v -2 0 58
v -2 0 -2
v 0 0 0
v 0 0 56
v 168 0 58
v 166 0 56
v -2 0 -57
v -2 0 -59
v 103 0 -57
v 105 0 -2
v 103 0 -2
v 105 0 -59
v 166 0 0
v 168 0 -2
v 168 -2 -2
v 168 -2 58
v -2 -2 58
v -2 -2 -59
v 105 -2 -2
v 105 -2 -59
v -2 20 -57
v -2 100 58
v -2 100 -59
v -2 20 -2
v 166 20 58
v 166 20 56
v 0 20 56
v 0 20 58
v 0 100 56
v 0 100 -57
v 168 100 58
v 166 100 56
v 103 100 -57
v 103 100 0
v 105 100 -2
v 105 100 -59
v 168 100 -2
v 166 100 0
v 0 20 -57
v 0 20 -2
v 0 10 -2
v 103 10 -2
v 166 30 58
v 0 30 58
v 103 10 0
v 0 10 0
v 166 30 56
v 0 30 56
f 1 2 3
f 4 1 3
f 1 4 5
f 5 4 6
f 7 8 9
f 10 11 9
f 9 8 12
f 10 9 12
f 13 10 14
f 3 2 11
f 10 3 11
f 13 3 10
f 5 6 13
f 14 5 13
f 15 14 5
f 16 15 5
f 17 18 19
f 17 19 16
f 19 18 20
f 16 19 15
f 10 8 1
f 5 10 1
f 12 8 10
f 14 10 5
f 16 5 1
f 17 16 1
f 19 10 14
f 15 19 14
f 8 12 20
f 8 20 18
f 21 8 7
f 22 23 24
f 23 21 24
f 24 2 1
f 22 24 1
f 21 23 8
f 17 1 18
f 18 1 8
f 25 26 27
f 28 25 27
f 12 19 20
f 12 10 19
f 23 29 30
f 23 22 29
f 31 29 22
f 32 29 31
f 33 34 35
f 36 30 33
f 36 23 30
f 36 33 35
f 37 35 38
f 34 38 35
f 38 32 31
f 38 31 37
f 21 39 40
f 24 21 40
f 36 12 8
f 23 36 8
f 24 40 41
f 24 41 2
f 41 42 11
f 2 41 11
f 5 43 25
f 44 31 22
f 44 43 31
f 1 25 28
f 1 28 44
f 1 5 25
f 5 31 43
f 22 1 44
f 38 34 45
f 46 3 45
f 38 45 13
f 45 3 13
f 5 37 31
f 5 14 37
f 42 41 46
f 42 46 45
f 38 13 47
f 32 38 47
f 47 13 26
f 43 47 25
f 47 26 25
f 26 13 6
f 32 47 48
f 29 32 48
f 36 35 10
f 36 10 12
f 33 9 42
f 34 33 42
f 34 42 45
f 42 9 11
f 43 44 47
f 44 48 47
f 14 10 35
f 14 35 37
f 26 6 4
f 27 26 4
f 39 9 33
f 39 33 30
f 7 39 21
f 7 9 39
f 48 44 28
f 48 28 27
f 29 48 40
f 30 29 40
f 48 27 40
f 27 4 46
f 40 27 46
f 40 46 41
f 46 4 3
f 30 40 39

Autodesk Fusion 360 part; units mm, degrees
sketch "Sketch1" plane through (0, 0, 0) normal (0, 1, 0) x (1, 0, 0)
  line L0 (0, 0) -> (166, 0)
  line L1 (166, 0) -> (166, -56)
  line L2 (166, -56) -> (0, -56)
  line L3 (0, -56) -> (0, 0)
  line L4 (168, -58) -> (-2, -58)
  line L5 (-2, -58) -> (-2, 2)
  line L6 (-2, 2) -> (168, 2)
  line L7 (168, 2) -> (168, -58)
  line L8 (0, 2) -> (103, 2)
  line L9 (103, 2) -> (103, 57)
  line L10 (103, 57) -> (0, 57)
  line L11 (0, 57) -> (0, 2)
  line L12 (105, 0) -> (105, 59)
  line L13 (105, 59) -> (-2, 59)
  line L14 (-2, 59) -> (-2, 0)
  line L15 (-2, 0) -> (105, 0)
  line L16 (0, 2) -> (0, 0)
  dimension "d1" = 166
  dimension "d2" = 56
  dimension "d3" = -2
  dimension "d4" = 103
  dimension "d5" = 55
  dimension "d6" = 2
extrude "Extrude1" add sketch "Sketch1" along normal blind 50 contours L6 L9 L10 L11 L12 L13 L14 makes body 1
extrude "Extrude2" add sketch "Sketch1" along normal blind 10 contours L0 L6 L8 L12 L15 L16 | L5 L6 L14 L15 L16 bodies 1
extrude "Extrude3" add sketch "Sketch1" along normal blind 50 separate body contours L0 L1 L2 L3 L4 L5 L6 L7 L12 L15 makes body 2
extrude "Extrude4" add 1 faces at (-1.3333, 23.3333, -2) along direction (0, 0, 1) blind 2 on bodies 1 bodies 1 2
extrude "Extrude5" add sketch "Sketch1" against normal blind 2 separate body makes body 3
sketch "Sketch2" plane through (-2, 0, 0) normal (-1, 0, 0) x (0, 0, 1)
  line L0 (-59, 0) -> (58, 0)
  line L1 (58, 0) -> (58, 50)
  line L2 (58, 50) -> (-59, 50)
  line L3 (-59, 50) -> (-59, 0)
sketch "Sketch3" plane through (0, 0, 0) normal (1, 0, 0) x (0, 0, -1)
  line L0 (2, 0) -> (57, 0)
  line L1 (57, 0) -> (57, 50)
  line L2 (57, 50) -> (-56, 50)
  line L3 (-56, 50) -> (-56, 0)
  line L4 (-56, 0) -> (0, 0)
  line L5 (0, 0) -> (0, 10)
  line L6 (0, 10) -> (2, 10)
  line L7 (2, 10) -> (2, 0)
  line L8 (2, 0) -> (57, 0)
  line L9 (57, 0) -> (57, 20)
  line L10 (57, 20) -> (2, 20)
  line L11 (2, 20) -> (2, 0)
  dimension "d17" = 20
extrude "Extrude6" cut sketch "Sketch3" against normal blind 2 contours L0 L1 L7 L8 L9 L10 L11 bodies 1
extrude "Extrude7" add 1 faces at (103.6667, 23.3333, -2) along direction (0, 0, 1) blind 2 on bodies 1 bodies 1
sketch "Sketch4" plane through (0, 50, 0) normal (0, 1, 0) x (-1, 0, 0)
  line L0 (-105, -2) -> (-105, -59)
  line L1 (-105, -59) -> (2, -59)
  line L2 (2, -59) -> (2, 58)
  line L3 (2, 58) -> (-168, 58)
  line L4 (-168, 58) -> (-168, -2)
  line L5 (-168, -2) -> (-105, -2)
  line L6 (-103, -57) -> (-103, 0)
  line L7 (-103, 0) -> (-166, 0)
  line L8 (-166, 0) -> (-166, 56)
  line L9 (-166, 56) -> (0, 56)
  line L10 (0, 56) -> (0, -57)
  line L11 (0, -57) -> (-103, -57)
  line L12 (2, 58) -> (2, 8)
  line L13 (0, 8) -> (-168, 8)
  line L14 (2, 8) -> (0, 8)
  dimension "d22" = 50
sketch "Sketch5" plane through (0, 50, 0) normal (0, 1, 0) x (-1, 0, 0)
sketch "Sketch6" plane through (0, 0, 58) normal (0, 0, 1) x (1, 0, 0)
  line L0 (-2, 0) -> (168, 0)
  line L1 (168, 0) -> (168, 50)
  line L2 (168, 50) -> (-2, 50)
  line L3 (-2, 50) -> (-2, 0)
sketch "Sketch7" plane through (0, 0, 56) normal (0, 0, -1) x (-1, 0, 0)
  line L0 (-166, 0) -> (0, 0)
  line L1 (0, 0) -> (0, 50)
  line L2 (0, 50) -> (-166, 50)
  line L3 (-166, 50) -> (-166, 0)
  line L4 (-166, 0) -> (-166, 20)
  line L5 (-166, 20) -> (0, 20)
  line L6 (0, 20) -> (0, 30)
  line L7 (0, 30) -> (-166, 30)
  line L8 (-166, 30) -> (-166, 20)
  dimension "d24" = 20
extrude "Extrude8" cut sketch "Sketch7" against normal blind 2 contours L1 L3 L5 L6 L7 L8 bodies 1
extrude "Extrude9" add 1 faces at (110.6667, 50, 57.3333) along direction (0, 1, 0) blind 50 on bodies 1 bodies 1
sketch "Sketch8" plane through (0, -2, 0) normal (0, -1, 0) x (1, 0, 0)
  line L0 (105, -59) -> (105, -2)
  line L1 (105, -2) -> (168, -2)
  line L2 (168, -2) -> (168, 58)
  line L3 (168, 58) -> (-2, 58)
  line L4 (-2, 58) -> (-2, -59)
  line L5 (-2, -59) -> (105, -59)
  circle A0 centre (0, 80) radius 15
  circle A1 centre (40, 80) radius 15
  circle A2 centre (80, 80) radius 15
  circle A3 centre (120, 80) radius 15
  circle A4 centre (160, 80) radius 15
  circle A5 centre (200, 80) radius 15
  circle A6 centre (-40, 80) radius 15
  circle A7 centre (-80, 80) radius 15
  circle A8 centre (-120, 80) radius 15
  circle A9 centre (-160, 80) radius 15
  circle A10 centre (240, 80) radius 15
  circle A11 centre (280, 80) radius 15
  circle A12 centre (320, 80) radius 15
  circle A13 centre (360, 80) radius 15
  circle A14 centre (-200, 80) radius 15
  circle A15 centre (400, 80) radius 15
  circle A16 centre (-240, 80) radius 15
  line L6 (-260, 60) -> (420, 60)
  line L7 (420, 60) -> (420, 100)
  line L8 (420, 100) -> (-260, 100)
  line L9 (-260, 100) -> (-260, 60)
  dimension "d29" = 30
  dimension "d30" = 30
  dimension "d31" = 30
  dimension "d32" = 30
  dimension "d33" = 30
  dimension "d34" = 30
  dimension "d35" = 30
  dimension "d36" = 30
  dimension "d37" = 30
  dimension "d38" = 30
  dimension "d39" = 30
  dimension "d40" = 30
  dimension "d41" = 30
  dimension "d42" = 30
  dimension "d43" = 30
  dimension "d44" = 30
  dimension "d45" = 30
sketch "Sketch9" plane through (0, 43, 0) normal (0, -1, 0) x (1, 0, 0)
  circle A0 centre (-120, 80) radius 15
  circle A1 centre (-40, 80) radius 15
  circle A2 centre (0, 80) radius 15
  circle A3 centre (120, 80) radius 15
  circle A4 centre (160, 80) radius 15
  circle A5 centre (-160, 80) radius 15
  circle A6 centre (80, 80) radius 15
  circle A7 centre (40, 80) radius 15
  circle A8 centre (240, 80) radius 15
  circle A9 centre (200, 80) radius 15
  circle A10 centre (-80, 80) radius 15
  circle A11 centre (-200, 80) radius 15
  circle A12 centre (360, 80) radius 15
  circle A13 centre (320, 80) radius 15
  circle A14 centre (-240, 80) radius 15
  circle A15 centre (280, 80) radius 15
  circle A16 centre (400, 80) radius 15
  line L0 (-260, 100) -> (-260, 60)
  line L1 (-260, 60) -> (420, 60)
  line L2 (420, 60) -> (420, 100)
  line L3 (420, 100) -> (-260, 100)
  line L4 (-260, 100) -> (420, 100)
  line L5 (420, 100) -> (420, 60)
  line L6 (420, 60) -> (-260, 60)
  line L7 (-260, 60) -> (-260, 100)
  line L8 (418, 62) -> (-258, 62)
  line L9 (-258, 62) -> (-258, 98)
  line L10 (-258, 98) -> (418, 98)
  line L11 (418, 98) -> (418, 62)
  dimension "d50" = 2
